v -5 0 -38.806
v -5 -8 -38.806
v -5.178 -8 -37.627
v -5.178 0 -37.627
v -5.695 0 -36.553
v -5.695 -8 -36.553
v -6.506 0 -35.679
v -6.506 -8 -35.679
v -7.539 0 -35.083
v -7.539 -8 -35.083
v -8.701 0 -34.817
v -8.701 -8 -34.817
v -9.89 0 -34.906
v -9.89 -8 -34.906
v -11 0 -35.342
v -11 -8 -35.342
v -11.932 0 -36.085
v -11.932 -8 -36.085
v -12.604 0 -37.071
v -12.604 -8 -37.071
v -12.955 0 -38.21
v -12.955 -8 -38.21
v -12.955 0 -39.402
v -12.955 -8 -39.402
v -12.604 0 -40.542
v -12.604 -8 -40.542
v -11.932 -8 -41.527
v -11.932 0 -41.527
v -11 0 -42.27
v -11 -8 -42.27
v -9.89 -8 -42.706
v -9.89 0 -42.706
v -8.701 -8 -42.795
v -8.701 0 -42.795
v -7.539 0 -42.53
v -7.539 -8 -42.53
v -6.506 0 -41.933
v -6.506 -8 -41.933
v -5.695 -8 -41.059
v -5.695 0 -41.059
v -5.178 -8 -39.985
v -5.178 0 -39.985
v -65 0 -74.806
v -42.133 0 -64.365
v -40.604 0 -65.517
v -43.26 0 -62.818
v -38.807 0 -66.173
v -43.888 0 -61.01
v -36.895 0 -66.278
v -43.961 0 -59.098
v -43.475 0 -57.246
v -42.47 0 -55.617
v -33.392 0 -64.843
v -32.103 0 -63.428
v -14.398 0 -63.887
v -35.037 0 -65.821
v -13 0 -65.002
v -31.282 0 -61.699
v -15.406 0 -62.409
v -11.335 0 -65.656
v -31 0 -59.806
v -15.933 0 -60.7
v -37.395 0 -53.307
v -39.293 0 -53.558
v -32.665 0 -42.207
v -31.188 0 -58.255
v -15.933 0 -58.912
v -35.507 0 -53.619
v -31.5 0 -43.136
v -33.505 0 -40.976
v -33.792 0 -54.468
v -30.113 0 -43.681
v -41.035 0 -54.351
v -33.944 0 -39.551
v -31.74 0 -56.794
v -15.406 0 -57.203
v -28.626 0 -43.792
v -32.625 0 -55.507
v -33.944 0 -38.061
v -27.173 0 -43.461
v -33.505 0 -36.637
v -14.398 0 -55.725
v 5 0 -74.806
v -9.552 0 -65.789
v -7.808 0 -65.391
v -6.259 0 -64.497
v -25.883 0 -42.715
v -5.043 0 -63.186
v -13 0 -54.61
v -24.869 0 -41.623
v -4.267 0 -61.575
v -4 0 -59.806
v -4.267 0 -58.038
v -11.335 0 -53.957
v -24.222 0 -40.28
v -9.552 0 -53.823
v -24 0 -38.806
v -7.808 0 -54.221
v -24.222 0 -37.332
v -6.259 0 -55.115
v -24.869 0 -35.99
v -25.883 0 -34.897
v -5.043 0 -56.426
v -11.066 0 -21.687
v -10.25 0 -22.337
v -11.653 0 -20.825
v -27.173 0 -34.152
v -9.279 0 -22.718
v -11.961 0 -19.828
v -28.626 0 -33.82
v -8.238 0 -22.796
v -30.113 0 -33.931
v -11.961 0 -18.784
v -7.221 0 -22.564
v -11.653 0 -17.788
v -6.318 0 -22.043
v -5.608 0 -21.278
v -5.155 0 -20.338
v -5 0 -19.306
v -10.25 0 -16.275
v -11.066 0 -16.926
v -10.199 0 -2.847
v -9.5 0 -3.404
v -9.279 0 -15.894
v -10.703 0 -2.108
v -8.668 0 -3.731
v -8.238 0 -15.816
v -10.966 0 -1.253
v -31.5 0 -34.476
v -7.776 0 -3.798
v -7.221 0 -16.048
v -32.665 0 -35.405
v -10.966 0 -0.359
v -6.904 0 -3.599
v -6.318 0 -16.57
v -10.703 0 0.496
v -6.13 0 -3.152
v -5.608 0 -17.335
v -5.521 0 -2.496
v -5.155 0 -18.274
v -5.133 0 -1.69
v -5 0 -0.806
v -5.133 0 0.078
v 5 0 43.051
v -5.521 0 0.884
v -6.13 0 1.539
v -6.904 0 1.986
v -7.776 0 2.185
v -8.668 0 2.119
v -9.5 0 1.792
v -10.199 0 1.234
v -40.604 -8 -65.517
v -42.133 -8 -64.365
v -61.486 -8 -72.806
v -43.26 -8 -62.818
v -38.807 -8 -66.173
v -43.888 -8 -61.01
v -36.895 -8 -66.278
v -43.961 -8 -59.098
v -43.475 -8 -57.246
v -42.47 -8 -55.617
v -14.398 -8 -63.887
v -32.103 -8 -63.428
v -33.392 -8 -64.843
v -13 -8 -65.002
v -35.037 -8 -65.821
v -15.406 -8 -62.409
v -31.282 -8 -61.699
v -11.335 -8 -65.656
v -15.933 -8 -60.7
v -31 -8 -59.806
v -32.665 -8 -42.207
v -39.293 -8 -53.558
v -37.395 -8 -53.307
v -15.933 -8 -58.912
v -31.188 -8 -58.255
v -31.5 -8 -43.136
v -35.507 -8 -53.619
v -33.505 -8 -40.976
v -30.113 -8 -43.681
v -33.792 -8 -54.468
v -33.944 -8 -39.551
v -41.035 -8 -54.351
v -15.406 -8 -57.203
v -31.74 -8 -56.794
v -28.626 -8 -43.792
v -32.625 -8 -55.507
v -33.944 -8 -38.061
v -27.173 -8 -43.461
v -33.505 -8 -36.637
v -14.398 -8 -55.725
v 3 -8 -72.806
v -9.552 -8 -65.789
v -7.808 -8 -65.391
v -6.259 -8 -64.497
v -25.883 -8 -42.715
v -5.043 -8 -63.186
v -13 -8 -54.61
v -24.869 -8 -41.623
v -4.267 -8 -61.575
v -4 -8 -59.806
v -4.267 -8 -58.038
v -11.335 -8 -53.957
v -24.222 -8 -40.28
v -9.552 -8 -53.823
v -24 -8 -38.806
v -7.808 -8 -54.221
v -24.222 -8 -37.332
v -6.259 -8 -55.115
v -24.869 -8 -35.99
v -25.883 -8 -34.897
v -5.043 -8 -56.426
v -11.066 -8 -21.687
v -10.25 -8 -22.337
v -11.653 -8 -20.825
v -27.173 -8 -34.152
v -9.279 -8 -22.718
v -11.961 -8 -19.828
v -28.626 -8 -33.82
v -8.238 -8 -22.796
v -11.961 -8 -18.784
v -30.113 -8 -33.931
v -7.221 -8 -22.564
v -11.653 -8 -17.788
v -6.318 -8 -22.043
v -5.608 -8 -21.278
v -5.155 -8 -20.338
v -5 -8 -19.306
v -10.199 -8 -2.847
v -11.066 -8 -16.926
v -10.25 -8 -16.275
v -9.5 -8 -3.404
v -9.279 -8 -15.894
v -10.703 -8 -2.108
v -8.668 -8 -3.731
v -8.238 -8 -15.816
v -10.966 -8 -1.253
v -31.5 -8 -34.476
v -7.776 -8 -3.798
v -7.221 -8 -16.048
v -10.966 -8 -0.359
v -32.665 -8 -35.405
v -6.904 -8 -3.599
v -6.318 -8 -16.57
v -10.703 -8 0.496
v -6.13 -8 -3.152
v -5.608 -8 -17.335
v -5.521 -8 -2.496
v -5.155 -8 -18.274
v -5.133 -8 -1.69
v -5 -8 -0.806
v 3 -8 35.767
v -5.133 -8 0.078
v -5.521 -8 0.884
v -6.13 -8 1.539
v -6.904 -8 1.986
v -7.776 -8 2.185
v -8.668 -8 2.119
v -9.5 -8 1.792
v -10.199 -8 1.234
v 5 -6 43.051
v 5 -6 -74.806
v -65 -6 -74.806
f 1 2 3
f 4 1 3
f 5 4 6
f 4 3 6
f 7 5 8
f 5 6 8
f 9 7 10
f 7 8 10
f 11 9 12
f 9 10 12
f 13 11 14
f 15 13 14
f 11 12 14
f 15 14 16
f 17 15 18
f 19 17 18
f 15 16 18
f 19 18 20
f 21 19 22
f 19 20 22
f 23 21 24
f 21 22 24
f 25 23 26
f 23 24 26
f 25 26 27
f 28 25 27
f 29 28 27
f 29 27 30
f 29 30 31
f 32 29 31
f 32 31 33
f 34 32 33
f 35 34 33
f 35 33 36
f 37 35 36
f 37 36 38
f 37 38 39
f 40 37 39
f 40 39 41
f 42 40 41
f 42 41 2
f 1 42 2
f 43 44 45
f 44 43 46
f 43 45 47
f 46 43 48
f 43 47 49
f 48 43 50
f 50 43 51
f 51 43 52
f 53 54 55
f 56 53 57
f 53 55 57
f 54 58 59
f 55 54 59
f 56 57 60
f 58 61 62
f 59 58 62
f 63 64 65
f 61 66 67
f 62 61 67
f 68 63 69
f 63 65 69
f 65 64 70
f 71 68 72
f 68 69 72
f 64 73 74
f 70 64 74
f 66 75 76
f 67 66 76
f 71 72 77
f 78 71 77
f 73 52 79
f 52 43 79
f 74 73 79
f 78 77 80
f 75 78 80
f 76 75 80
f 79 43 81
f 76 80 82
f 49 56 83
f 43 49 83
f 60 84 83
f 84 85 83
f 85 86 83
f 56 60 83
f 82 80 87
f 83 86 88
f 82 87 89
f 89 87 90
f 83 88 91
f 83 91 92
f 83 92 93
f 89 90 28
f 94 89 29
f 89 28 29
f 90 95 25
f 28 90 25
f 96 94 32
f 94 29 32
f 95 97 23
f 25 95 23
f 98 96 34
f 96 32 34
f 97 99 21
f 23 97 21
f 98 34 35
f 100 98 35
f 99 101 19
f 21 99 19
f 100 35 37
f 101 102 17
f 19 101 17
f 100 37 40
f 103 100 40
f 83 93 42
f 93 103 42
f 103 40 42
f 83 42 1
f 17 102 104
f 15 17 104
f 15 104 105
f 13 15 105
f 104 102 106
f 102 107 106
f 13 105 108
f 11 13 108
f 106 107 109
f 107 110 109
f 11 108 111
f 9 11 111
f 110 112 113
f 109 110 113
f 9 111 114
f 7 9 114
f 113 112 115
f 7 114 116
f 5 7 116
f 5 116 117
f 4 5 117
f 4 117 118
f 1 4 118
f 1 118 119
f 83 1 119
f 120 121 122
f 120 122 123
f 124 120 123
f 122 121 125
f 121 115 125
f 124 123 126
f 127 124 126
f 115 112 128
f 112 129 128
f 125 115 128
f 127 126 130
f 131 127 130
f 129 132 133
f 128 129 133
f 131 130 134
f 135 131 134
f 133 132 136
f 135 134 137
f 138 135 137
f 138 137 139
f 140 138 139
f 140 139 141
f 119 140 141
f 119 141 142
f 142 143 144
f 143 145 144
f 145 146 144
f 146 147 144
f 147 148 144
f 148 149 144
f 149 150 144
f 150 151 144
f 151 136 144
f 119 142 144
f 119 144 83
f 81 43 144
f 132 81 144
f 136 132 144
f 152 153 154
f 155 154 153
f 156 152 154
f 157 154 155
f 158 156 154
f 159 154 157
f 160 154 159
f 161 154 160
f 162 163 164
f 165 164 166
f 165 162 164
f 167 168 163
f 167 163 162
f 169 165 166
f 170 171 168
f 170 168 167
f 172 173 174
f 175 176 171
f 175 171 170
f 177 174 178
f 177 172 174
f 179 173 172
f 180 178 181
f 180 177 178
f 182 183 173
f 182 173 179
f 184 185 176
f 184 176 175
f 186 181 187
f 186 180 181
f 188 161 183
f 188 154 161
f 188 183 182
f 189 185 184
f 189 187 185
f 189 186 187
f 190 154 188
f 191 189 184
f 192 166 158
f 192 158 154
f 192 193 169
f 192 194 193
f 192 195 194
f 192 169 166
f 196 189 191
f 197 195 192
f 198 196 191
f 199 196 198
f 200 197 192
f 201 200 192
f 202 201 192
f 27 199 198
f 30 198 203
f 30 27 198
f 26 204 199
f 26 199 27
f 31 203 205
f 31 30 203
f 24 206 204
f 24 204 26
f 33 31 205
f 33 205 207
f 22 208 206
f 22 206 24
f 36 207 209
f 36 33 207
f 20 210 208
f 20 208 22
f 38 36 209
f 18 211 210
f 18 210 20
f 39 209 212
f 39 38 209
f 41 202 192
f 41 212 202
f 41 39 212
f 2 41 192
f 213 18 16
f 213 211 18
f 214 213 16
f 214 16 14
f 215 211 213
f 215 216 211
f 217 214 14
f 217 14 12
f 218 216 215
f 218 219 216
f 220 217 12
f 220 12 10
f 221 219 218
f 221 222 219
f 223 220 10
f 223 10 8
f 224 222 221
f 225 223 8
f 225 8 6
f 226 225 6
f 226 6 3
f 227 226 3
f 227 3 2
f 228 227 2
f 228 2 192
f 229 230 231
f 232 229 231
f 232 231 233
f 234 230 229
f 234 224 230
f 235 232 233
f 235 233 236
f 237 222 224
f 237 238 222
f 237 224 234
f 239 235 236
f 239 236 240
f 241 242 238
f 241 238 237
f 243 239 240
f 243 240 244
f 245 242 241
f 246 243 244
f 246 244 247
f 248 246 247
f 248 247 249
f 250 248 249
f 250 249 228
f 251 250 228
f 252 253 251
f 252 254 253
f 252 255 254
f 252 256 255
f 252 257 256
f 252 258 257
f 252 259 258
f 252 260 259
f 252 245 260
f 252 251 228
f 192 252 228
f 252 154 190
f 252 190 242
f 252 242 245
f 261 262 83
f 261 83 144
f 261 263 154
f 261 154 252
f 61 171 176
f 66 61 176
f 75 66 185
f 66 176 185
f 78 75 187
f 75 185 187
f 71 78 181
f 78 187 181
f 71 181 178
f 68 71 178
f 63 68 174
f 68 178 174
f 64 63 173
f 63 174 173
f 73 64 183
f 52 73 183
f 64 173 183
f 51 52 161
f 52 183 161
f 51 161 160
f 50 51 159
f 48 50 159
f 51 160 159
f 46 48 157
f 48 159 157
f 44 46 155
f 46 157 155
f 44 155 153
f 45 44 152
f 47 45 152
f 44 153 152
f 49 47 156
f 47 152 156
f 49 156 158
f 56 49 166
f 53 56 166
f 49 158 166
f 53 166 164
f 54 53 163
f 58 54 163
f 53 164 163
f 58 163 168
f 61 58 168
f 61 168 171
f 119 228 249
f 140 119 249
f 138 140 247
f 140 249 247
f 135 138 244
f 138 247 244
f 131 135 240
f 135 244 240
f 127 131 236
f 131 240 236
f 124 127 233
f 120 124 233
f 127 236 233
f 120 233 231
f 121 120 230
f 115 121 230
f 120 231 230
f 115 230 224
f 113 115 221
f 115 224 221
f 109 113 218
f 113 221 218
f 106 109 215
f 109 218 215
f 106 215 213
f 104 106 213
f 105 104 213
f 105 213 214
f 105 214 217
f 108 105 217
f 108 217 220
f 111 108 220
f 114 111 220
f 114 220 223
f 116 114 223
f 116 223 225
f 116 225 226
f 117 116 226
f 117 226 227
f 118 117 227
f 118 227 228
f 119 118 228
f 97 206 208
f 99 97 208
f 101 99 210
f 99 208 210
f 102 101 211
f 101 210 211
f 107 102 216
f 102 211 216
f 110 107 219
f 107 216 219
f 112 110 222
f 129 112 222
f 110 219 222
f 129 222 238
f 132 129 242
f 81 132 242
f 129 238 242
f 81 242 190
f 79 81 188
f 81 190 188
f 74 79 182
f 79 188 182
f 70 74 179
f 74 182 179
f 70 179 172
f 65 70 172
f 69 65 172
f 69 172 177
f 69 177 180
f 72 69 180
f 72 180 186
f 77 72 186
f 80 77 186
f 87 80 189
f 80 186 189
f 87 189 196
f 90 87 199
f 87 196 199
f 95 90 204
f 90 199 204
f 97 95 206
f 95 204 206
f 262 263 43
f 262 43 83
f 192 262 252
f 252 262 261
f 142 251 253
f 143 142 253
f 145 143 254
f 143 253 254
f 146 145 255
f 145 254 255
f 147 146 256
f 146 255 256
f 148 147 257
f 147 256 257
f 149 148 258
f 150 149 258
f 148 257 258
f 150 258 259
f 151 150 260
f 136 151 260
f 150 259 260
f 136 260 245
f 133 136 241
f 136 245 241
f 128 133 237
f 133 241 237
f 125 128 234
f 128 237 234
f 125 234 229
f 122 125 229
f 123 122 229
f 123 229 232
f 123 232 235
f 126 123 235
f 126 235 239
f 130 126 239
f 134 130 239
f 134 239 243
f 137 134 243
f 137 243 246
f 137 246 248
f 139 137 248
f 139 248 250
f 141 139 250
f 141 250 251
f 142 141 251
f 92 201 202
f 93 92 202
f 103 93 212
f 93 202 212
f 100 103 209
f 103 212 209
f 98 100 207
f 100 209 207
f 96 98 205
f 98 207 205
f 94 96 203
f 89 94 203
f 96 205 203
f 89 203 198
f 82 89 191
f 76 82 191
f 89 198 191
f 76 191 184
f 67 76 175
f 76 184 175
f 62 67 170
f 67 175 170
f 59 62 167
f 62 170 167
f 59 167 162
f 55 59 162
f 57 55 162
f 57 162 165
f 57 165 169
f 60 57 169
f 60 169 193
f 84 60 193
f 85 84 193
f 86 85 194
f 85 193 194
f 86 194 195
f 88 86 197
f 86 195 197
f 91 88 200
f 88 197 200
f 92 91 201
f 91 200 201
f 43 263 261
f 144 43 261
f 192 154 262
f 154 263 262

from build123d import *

# Parameters (mm, degrees)
F1_DEPTH  = 8
F3_DEPTH  = 8
F5_DEPTH  = 25
F7_DEPTH  = 25
F9_DEPTH  = 25
F11_DEPTH = 8
F13_DEPTH = 25
F14_R     = 6.3379866709
F14_R_2   = 4
F14_R_3   = 6.8285415101
F14_R_4   = 3.5
F14_R_5   = 5.2949091489
F14_R_6   = 3
F15_DEPTH = 8
F16_R     = 4
F16_R_2   = 3.5
F16_R_3   = 3
F17_DEPTH = 25
F18_R     = 6.5
F18_R_2   = 6
F19_DEPTH = 25
F20_R     = 6.5
F20_R_2   = 5
F21_DEPTH = 25
F22_R     = 6
F22_R_2   = 5
F23_DEPTH = 8
F24_R     = 9.6843488415
F24_R_2   = 6.5
F25_DEPTH = 8
F26_R     = 6.5
F26_R_2   = 6
F27_DEPTH = 8
F29_DEPTH = 25
F30_SIZE  = 2


with BuildPart() as f1:
    # F0 (on Front) → F1 (new body)
    with BuildSketch(Plane.XZ):
        Polygon((-70, -74.8061388731), (0, -74.8061388731), (0, 65.1938611269), align=None)
    extrude(amount=F1_DEPTH)

    # F2 (on face) → F3 (join)
    with BuildSketch(Plane.XZ.offset(8)):
        Polygon((-70, -74.8061388731), (0, 65.1938611269), (0, 115.1938611269), align=None)
    extrude(amount=-F3_DEPTH)

    # F4 (on face) → F5 (cut)
    with BuildSketch(Plane.XZ.offset(8)):
        Polygon((0, 65.1938611269), (0, 115.1938611269), (-70, -74.8061388731), align=None)
    extrude(amount=-F5_DEPTH, mode=Mode.SUBTRACT)

    # F6 (on face) → F7 (cut)
    with BuildSketch(Plane.XZ.offset(8)):
        with BuildLine():
            Line((-10, -59.8061388731), (-10, -64.8061388731))
            ThreePointArc((-10, -64.8061388731), (-6.4644660941, -63.341672779), (-5, -59.8061388731))
            ThreePointArc((-5, -59.8061388731), (-6.4644660941, -56.2706049672), (-10, -54.8061388731))
            Line((-10, -54.8061388731), (-10, -59.8061388731))
        make_face()
        with BuildLine():
            ThreePointArc((-10, -54.8061388731), (-15, -59.8061388731), (-10, -64.8061388731))
            Line((-10, -64.8061388731), (-10, -59.8061388731))
            Line((-10, -59.8061388731), (-10, -54.8061388731))
        make_face()
        with BuildLine():
            Line((-10, -38.8061388731), (-10, -42.8061388731))
            ThreePointArc((-10, -42.8061388731), (-7.1715728753, -41.6345659978), (-6, -38.8061388731))
            ThreePointArc((-6, -38.8061388731), (-7.1715728753, -35.9777117484), (-10, -34.8061388731))
            Line((-10, -34.8061388731), (-10, -38.8061388731))
        make_face()
        with BuildLine():
            ThreePointArc((-10, -34.8061388731), (-14, -38.8061388731), (-10, -42.8061388731))
            Line((-10, -42.8061388731), (-10, -38.8061388731))
            Line((-10, -38.8061388731), (-10, -34.8061388731))
        make_face()
        with BuildLine():
            Line((-10, -19.3061388731), (-10, -22.8061388731))
            ThreePointArc((-10, -22.8061388731), (-7.5251262658, -21.7810126073), (-6.5, -19.3061388731))
            ThreePointArc((-6.5, -19.3061388731), (-7.5251262658, -16.8312651389), (-10, -15.8061388731))
            Line((-10, -15.8061388731), (-10, -19.3061388731))
        make_face()
        with BuildLine():
            ThreePointArc((-10, -15.8061388731), (-13.5, -19.3061388731), (-10, -22.8061388731))
            Line((-10, -22.8061388731), (-10, -19.3061388731))
            Line((-10, -19.3061388731), (-10, -15.8061388731))
        make_face()
        with BuildLine():
            ThreePointArc((-7, -0.8061388731), (-12.1213203436, 1.3151814705), (-10, -3.8061388731))
            ThreePointArc((-10, -3.8061388731), (-7.8786796564, -2.9274592167), (-7, -0.8061388731))
        make_face()
    extrude(amount=-F7_DEPTH, mode=Mode.SUBTRACT)

    # F8 (on face) → F9 (cut)
    with BuildSketch(Plane.XZ.offset(8)):
        Polygon((0, 35.1938611269), (0, 65.1938611269), (-70, -74.8061388731), align=None)
    extrude(amount=-F9_DEPTH, mode=Mode.SUBTRACT)

    # F10 (on face) → F11 (join)
    with BuildSketch(Plane.XZ.offset(8)):
        Polygon((5, 43.051003984), (0, 35.1938611269), (0, -74.8061388731), (5, -74.8061388731), align=None)
    extrude(amount=-F11_DEPTH)

    # F12 (on face) → F13 (cut)
    with BuildSketch(Plane.XZ.offset(8)):
        Polygon((5, 43.051003984), (-70, -74.8061388731), (-65, -74.8061388731), align=None)
    extrude(amount=-F13_DEPTH, mode=Mode.SUBTRACT)

    # F14 (on face) → F15 (join)
    with BuildSketch(Plane.XZ.offset(8)):
        with Locations((-10, -38.8061388731)):
            Circle(F14_R)
        with Locations((-10, -38.8061388731)):
            Circle(F14_R_2, mode=Mode.SUBTRACT)
        with Locations((-10, -38.8061388731)):
            Circle(F14_R_2)
        with Locations((-10, -19.3061388731)):
            Circle(F14_R_3)
        with Locations((-10, -19.3061388731)):
            Circle(F14_R_4, mode=Mode.SUBTRACT)
        with Locations((-10, -19.3061388731)):
            Circle(F14_R_4)
        with Locations((-10, -0.8061388731)):
            Circle(F14_R_5)
        with Locations((-10, -0.8061388731)):
            Circle(F14_R_6, mode=Mode.SUBTRACT)
        with Locations((-10, -0.8061388731)):
            Circle(F14_R_6)
    extrude(amount=-F15_DEPTH)

    # F16 (on face) → F17 (cut)
    with BuildSketch(Plane.XZ.offset(8)):
        with Locations((-9, -38.8061388731)):
            Circle(F16_R)
        with Locations((-8.5, -19.3061388731)):
            Circle(F16_R_2)
        with Locations((-8, -0.8061388731)):
            Circle(F16_R_3)
    extrude(amount=-F17_DEPTH, mode=Mode.SUBTRACT)

    # F18 (on face) → F19 (cut)
    with BuildSketch(Plane.XZ.offset(8)):
        with Locations((-31.5, -59.8061388731)):
            Circle(F18_R)
        with Locations((-29, -38.8061388731)):
            Circle(F18_R_2)
    extrude(amount=-F19_DEPTH, mode=Mode.SUBTRACT)

    # F20 (on face) → F21 (cut)
    with BuildSketch(Plane.XZ.offset(8)):
        with Locations((-10, -59.8061388731)):
            Circle(F20_R)
        with Locations((-10, -59.8061388731)):
            Circle(F20_R_2, mode=Mode.SUBTRACT)
    extrude(amount=-F21_DEPTH, mode=Mode.SUBTRACT)

    # F22 (on face) → F23 (join)
    with BuildSketch(Plane.XZ.offset(8)):
        with Locations((-29, -38.8061388731)):
            Circle(F22_R)
        with Locations((-29, -38.8061388731)):
            Circle(F22_R_2, mode=Mode.SUBTRACT)
    extrude(amount=-F23_DEPTH)

    # F24 (on face) → F25 (join)
    with BuildSketch(Plane.XZ.offset(8)):
        with Locations((-31.5, -59.8061388731)):
            Circle(F24_R)
        with Locations((-31.5, -59.8061388731)):
            Circle(F24_R_2, mode=Mode.SUBTRACT)
        with Locations((-31.5, -59.8061388731)):
            Circle(F24_R_2)
    extrude(amount=-F25_DEPTH)

    # F26 (on face) → F27 (join)
    with BuildSketch(Plane.XZ.offset(8)):
        with Locations((-10, -59.8061388731)):
            Circle(F26_R)
        with Locations((-10, -59.8061388731)):
            Circle(F26_R_2, mode=Mode.SUBTRACT)
    extrude(amount=-F27_DEPTH)

    # F28 (on face) → F29 (cut)
    with BuildSketch(Plane.XZ.offset(8)):
        with BuildLine():
            ThreePointArc((-33.7916220485, -54.4677933458), (-43.259967738, -62.8182430641), (-31, -59.8061388731))
            Line((-31, -59.8061388731), (-37.5, -59.8061388731))
            Line((-37.5, -59.8061388731), (-33.7916220485, -54.4677933458))
        make_face()
        with BuildLine():
            Line((-37.5, -59.8061388731), (-31, -59.8061388731))
            ThreePointArc((-31, -59.8061388731), (-31.740032262, -56.7940346821), (-33.7916220485, -54.4677933458))
            Line((-33.7916220485, -54.4677933458), (-37.5, -59.8061388731))
        make_face()
    extrude(amount=-F29_DEPTH, mode=Mode.SUBTRACT)

    # F30
    f30_edges = [f1.edges().sort_by_distance(p)[0] for p in [
        (5, -8, -15.877567),
        (-30, -8, -15.877567),
        (-30, -8, -74.806139),
    ]]
    chamfer(f30_edges, length=F30_SIZE)


solid = f1.part
